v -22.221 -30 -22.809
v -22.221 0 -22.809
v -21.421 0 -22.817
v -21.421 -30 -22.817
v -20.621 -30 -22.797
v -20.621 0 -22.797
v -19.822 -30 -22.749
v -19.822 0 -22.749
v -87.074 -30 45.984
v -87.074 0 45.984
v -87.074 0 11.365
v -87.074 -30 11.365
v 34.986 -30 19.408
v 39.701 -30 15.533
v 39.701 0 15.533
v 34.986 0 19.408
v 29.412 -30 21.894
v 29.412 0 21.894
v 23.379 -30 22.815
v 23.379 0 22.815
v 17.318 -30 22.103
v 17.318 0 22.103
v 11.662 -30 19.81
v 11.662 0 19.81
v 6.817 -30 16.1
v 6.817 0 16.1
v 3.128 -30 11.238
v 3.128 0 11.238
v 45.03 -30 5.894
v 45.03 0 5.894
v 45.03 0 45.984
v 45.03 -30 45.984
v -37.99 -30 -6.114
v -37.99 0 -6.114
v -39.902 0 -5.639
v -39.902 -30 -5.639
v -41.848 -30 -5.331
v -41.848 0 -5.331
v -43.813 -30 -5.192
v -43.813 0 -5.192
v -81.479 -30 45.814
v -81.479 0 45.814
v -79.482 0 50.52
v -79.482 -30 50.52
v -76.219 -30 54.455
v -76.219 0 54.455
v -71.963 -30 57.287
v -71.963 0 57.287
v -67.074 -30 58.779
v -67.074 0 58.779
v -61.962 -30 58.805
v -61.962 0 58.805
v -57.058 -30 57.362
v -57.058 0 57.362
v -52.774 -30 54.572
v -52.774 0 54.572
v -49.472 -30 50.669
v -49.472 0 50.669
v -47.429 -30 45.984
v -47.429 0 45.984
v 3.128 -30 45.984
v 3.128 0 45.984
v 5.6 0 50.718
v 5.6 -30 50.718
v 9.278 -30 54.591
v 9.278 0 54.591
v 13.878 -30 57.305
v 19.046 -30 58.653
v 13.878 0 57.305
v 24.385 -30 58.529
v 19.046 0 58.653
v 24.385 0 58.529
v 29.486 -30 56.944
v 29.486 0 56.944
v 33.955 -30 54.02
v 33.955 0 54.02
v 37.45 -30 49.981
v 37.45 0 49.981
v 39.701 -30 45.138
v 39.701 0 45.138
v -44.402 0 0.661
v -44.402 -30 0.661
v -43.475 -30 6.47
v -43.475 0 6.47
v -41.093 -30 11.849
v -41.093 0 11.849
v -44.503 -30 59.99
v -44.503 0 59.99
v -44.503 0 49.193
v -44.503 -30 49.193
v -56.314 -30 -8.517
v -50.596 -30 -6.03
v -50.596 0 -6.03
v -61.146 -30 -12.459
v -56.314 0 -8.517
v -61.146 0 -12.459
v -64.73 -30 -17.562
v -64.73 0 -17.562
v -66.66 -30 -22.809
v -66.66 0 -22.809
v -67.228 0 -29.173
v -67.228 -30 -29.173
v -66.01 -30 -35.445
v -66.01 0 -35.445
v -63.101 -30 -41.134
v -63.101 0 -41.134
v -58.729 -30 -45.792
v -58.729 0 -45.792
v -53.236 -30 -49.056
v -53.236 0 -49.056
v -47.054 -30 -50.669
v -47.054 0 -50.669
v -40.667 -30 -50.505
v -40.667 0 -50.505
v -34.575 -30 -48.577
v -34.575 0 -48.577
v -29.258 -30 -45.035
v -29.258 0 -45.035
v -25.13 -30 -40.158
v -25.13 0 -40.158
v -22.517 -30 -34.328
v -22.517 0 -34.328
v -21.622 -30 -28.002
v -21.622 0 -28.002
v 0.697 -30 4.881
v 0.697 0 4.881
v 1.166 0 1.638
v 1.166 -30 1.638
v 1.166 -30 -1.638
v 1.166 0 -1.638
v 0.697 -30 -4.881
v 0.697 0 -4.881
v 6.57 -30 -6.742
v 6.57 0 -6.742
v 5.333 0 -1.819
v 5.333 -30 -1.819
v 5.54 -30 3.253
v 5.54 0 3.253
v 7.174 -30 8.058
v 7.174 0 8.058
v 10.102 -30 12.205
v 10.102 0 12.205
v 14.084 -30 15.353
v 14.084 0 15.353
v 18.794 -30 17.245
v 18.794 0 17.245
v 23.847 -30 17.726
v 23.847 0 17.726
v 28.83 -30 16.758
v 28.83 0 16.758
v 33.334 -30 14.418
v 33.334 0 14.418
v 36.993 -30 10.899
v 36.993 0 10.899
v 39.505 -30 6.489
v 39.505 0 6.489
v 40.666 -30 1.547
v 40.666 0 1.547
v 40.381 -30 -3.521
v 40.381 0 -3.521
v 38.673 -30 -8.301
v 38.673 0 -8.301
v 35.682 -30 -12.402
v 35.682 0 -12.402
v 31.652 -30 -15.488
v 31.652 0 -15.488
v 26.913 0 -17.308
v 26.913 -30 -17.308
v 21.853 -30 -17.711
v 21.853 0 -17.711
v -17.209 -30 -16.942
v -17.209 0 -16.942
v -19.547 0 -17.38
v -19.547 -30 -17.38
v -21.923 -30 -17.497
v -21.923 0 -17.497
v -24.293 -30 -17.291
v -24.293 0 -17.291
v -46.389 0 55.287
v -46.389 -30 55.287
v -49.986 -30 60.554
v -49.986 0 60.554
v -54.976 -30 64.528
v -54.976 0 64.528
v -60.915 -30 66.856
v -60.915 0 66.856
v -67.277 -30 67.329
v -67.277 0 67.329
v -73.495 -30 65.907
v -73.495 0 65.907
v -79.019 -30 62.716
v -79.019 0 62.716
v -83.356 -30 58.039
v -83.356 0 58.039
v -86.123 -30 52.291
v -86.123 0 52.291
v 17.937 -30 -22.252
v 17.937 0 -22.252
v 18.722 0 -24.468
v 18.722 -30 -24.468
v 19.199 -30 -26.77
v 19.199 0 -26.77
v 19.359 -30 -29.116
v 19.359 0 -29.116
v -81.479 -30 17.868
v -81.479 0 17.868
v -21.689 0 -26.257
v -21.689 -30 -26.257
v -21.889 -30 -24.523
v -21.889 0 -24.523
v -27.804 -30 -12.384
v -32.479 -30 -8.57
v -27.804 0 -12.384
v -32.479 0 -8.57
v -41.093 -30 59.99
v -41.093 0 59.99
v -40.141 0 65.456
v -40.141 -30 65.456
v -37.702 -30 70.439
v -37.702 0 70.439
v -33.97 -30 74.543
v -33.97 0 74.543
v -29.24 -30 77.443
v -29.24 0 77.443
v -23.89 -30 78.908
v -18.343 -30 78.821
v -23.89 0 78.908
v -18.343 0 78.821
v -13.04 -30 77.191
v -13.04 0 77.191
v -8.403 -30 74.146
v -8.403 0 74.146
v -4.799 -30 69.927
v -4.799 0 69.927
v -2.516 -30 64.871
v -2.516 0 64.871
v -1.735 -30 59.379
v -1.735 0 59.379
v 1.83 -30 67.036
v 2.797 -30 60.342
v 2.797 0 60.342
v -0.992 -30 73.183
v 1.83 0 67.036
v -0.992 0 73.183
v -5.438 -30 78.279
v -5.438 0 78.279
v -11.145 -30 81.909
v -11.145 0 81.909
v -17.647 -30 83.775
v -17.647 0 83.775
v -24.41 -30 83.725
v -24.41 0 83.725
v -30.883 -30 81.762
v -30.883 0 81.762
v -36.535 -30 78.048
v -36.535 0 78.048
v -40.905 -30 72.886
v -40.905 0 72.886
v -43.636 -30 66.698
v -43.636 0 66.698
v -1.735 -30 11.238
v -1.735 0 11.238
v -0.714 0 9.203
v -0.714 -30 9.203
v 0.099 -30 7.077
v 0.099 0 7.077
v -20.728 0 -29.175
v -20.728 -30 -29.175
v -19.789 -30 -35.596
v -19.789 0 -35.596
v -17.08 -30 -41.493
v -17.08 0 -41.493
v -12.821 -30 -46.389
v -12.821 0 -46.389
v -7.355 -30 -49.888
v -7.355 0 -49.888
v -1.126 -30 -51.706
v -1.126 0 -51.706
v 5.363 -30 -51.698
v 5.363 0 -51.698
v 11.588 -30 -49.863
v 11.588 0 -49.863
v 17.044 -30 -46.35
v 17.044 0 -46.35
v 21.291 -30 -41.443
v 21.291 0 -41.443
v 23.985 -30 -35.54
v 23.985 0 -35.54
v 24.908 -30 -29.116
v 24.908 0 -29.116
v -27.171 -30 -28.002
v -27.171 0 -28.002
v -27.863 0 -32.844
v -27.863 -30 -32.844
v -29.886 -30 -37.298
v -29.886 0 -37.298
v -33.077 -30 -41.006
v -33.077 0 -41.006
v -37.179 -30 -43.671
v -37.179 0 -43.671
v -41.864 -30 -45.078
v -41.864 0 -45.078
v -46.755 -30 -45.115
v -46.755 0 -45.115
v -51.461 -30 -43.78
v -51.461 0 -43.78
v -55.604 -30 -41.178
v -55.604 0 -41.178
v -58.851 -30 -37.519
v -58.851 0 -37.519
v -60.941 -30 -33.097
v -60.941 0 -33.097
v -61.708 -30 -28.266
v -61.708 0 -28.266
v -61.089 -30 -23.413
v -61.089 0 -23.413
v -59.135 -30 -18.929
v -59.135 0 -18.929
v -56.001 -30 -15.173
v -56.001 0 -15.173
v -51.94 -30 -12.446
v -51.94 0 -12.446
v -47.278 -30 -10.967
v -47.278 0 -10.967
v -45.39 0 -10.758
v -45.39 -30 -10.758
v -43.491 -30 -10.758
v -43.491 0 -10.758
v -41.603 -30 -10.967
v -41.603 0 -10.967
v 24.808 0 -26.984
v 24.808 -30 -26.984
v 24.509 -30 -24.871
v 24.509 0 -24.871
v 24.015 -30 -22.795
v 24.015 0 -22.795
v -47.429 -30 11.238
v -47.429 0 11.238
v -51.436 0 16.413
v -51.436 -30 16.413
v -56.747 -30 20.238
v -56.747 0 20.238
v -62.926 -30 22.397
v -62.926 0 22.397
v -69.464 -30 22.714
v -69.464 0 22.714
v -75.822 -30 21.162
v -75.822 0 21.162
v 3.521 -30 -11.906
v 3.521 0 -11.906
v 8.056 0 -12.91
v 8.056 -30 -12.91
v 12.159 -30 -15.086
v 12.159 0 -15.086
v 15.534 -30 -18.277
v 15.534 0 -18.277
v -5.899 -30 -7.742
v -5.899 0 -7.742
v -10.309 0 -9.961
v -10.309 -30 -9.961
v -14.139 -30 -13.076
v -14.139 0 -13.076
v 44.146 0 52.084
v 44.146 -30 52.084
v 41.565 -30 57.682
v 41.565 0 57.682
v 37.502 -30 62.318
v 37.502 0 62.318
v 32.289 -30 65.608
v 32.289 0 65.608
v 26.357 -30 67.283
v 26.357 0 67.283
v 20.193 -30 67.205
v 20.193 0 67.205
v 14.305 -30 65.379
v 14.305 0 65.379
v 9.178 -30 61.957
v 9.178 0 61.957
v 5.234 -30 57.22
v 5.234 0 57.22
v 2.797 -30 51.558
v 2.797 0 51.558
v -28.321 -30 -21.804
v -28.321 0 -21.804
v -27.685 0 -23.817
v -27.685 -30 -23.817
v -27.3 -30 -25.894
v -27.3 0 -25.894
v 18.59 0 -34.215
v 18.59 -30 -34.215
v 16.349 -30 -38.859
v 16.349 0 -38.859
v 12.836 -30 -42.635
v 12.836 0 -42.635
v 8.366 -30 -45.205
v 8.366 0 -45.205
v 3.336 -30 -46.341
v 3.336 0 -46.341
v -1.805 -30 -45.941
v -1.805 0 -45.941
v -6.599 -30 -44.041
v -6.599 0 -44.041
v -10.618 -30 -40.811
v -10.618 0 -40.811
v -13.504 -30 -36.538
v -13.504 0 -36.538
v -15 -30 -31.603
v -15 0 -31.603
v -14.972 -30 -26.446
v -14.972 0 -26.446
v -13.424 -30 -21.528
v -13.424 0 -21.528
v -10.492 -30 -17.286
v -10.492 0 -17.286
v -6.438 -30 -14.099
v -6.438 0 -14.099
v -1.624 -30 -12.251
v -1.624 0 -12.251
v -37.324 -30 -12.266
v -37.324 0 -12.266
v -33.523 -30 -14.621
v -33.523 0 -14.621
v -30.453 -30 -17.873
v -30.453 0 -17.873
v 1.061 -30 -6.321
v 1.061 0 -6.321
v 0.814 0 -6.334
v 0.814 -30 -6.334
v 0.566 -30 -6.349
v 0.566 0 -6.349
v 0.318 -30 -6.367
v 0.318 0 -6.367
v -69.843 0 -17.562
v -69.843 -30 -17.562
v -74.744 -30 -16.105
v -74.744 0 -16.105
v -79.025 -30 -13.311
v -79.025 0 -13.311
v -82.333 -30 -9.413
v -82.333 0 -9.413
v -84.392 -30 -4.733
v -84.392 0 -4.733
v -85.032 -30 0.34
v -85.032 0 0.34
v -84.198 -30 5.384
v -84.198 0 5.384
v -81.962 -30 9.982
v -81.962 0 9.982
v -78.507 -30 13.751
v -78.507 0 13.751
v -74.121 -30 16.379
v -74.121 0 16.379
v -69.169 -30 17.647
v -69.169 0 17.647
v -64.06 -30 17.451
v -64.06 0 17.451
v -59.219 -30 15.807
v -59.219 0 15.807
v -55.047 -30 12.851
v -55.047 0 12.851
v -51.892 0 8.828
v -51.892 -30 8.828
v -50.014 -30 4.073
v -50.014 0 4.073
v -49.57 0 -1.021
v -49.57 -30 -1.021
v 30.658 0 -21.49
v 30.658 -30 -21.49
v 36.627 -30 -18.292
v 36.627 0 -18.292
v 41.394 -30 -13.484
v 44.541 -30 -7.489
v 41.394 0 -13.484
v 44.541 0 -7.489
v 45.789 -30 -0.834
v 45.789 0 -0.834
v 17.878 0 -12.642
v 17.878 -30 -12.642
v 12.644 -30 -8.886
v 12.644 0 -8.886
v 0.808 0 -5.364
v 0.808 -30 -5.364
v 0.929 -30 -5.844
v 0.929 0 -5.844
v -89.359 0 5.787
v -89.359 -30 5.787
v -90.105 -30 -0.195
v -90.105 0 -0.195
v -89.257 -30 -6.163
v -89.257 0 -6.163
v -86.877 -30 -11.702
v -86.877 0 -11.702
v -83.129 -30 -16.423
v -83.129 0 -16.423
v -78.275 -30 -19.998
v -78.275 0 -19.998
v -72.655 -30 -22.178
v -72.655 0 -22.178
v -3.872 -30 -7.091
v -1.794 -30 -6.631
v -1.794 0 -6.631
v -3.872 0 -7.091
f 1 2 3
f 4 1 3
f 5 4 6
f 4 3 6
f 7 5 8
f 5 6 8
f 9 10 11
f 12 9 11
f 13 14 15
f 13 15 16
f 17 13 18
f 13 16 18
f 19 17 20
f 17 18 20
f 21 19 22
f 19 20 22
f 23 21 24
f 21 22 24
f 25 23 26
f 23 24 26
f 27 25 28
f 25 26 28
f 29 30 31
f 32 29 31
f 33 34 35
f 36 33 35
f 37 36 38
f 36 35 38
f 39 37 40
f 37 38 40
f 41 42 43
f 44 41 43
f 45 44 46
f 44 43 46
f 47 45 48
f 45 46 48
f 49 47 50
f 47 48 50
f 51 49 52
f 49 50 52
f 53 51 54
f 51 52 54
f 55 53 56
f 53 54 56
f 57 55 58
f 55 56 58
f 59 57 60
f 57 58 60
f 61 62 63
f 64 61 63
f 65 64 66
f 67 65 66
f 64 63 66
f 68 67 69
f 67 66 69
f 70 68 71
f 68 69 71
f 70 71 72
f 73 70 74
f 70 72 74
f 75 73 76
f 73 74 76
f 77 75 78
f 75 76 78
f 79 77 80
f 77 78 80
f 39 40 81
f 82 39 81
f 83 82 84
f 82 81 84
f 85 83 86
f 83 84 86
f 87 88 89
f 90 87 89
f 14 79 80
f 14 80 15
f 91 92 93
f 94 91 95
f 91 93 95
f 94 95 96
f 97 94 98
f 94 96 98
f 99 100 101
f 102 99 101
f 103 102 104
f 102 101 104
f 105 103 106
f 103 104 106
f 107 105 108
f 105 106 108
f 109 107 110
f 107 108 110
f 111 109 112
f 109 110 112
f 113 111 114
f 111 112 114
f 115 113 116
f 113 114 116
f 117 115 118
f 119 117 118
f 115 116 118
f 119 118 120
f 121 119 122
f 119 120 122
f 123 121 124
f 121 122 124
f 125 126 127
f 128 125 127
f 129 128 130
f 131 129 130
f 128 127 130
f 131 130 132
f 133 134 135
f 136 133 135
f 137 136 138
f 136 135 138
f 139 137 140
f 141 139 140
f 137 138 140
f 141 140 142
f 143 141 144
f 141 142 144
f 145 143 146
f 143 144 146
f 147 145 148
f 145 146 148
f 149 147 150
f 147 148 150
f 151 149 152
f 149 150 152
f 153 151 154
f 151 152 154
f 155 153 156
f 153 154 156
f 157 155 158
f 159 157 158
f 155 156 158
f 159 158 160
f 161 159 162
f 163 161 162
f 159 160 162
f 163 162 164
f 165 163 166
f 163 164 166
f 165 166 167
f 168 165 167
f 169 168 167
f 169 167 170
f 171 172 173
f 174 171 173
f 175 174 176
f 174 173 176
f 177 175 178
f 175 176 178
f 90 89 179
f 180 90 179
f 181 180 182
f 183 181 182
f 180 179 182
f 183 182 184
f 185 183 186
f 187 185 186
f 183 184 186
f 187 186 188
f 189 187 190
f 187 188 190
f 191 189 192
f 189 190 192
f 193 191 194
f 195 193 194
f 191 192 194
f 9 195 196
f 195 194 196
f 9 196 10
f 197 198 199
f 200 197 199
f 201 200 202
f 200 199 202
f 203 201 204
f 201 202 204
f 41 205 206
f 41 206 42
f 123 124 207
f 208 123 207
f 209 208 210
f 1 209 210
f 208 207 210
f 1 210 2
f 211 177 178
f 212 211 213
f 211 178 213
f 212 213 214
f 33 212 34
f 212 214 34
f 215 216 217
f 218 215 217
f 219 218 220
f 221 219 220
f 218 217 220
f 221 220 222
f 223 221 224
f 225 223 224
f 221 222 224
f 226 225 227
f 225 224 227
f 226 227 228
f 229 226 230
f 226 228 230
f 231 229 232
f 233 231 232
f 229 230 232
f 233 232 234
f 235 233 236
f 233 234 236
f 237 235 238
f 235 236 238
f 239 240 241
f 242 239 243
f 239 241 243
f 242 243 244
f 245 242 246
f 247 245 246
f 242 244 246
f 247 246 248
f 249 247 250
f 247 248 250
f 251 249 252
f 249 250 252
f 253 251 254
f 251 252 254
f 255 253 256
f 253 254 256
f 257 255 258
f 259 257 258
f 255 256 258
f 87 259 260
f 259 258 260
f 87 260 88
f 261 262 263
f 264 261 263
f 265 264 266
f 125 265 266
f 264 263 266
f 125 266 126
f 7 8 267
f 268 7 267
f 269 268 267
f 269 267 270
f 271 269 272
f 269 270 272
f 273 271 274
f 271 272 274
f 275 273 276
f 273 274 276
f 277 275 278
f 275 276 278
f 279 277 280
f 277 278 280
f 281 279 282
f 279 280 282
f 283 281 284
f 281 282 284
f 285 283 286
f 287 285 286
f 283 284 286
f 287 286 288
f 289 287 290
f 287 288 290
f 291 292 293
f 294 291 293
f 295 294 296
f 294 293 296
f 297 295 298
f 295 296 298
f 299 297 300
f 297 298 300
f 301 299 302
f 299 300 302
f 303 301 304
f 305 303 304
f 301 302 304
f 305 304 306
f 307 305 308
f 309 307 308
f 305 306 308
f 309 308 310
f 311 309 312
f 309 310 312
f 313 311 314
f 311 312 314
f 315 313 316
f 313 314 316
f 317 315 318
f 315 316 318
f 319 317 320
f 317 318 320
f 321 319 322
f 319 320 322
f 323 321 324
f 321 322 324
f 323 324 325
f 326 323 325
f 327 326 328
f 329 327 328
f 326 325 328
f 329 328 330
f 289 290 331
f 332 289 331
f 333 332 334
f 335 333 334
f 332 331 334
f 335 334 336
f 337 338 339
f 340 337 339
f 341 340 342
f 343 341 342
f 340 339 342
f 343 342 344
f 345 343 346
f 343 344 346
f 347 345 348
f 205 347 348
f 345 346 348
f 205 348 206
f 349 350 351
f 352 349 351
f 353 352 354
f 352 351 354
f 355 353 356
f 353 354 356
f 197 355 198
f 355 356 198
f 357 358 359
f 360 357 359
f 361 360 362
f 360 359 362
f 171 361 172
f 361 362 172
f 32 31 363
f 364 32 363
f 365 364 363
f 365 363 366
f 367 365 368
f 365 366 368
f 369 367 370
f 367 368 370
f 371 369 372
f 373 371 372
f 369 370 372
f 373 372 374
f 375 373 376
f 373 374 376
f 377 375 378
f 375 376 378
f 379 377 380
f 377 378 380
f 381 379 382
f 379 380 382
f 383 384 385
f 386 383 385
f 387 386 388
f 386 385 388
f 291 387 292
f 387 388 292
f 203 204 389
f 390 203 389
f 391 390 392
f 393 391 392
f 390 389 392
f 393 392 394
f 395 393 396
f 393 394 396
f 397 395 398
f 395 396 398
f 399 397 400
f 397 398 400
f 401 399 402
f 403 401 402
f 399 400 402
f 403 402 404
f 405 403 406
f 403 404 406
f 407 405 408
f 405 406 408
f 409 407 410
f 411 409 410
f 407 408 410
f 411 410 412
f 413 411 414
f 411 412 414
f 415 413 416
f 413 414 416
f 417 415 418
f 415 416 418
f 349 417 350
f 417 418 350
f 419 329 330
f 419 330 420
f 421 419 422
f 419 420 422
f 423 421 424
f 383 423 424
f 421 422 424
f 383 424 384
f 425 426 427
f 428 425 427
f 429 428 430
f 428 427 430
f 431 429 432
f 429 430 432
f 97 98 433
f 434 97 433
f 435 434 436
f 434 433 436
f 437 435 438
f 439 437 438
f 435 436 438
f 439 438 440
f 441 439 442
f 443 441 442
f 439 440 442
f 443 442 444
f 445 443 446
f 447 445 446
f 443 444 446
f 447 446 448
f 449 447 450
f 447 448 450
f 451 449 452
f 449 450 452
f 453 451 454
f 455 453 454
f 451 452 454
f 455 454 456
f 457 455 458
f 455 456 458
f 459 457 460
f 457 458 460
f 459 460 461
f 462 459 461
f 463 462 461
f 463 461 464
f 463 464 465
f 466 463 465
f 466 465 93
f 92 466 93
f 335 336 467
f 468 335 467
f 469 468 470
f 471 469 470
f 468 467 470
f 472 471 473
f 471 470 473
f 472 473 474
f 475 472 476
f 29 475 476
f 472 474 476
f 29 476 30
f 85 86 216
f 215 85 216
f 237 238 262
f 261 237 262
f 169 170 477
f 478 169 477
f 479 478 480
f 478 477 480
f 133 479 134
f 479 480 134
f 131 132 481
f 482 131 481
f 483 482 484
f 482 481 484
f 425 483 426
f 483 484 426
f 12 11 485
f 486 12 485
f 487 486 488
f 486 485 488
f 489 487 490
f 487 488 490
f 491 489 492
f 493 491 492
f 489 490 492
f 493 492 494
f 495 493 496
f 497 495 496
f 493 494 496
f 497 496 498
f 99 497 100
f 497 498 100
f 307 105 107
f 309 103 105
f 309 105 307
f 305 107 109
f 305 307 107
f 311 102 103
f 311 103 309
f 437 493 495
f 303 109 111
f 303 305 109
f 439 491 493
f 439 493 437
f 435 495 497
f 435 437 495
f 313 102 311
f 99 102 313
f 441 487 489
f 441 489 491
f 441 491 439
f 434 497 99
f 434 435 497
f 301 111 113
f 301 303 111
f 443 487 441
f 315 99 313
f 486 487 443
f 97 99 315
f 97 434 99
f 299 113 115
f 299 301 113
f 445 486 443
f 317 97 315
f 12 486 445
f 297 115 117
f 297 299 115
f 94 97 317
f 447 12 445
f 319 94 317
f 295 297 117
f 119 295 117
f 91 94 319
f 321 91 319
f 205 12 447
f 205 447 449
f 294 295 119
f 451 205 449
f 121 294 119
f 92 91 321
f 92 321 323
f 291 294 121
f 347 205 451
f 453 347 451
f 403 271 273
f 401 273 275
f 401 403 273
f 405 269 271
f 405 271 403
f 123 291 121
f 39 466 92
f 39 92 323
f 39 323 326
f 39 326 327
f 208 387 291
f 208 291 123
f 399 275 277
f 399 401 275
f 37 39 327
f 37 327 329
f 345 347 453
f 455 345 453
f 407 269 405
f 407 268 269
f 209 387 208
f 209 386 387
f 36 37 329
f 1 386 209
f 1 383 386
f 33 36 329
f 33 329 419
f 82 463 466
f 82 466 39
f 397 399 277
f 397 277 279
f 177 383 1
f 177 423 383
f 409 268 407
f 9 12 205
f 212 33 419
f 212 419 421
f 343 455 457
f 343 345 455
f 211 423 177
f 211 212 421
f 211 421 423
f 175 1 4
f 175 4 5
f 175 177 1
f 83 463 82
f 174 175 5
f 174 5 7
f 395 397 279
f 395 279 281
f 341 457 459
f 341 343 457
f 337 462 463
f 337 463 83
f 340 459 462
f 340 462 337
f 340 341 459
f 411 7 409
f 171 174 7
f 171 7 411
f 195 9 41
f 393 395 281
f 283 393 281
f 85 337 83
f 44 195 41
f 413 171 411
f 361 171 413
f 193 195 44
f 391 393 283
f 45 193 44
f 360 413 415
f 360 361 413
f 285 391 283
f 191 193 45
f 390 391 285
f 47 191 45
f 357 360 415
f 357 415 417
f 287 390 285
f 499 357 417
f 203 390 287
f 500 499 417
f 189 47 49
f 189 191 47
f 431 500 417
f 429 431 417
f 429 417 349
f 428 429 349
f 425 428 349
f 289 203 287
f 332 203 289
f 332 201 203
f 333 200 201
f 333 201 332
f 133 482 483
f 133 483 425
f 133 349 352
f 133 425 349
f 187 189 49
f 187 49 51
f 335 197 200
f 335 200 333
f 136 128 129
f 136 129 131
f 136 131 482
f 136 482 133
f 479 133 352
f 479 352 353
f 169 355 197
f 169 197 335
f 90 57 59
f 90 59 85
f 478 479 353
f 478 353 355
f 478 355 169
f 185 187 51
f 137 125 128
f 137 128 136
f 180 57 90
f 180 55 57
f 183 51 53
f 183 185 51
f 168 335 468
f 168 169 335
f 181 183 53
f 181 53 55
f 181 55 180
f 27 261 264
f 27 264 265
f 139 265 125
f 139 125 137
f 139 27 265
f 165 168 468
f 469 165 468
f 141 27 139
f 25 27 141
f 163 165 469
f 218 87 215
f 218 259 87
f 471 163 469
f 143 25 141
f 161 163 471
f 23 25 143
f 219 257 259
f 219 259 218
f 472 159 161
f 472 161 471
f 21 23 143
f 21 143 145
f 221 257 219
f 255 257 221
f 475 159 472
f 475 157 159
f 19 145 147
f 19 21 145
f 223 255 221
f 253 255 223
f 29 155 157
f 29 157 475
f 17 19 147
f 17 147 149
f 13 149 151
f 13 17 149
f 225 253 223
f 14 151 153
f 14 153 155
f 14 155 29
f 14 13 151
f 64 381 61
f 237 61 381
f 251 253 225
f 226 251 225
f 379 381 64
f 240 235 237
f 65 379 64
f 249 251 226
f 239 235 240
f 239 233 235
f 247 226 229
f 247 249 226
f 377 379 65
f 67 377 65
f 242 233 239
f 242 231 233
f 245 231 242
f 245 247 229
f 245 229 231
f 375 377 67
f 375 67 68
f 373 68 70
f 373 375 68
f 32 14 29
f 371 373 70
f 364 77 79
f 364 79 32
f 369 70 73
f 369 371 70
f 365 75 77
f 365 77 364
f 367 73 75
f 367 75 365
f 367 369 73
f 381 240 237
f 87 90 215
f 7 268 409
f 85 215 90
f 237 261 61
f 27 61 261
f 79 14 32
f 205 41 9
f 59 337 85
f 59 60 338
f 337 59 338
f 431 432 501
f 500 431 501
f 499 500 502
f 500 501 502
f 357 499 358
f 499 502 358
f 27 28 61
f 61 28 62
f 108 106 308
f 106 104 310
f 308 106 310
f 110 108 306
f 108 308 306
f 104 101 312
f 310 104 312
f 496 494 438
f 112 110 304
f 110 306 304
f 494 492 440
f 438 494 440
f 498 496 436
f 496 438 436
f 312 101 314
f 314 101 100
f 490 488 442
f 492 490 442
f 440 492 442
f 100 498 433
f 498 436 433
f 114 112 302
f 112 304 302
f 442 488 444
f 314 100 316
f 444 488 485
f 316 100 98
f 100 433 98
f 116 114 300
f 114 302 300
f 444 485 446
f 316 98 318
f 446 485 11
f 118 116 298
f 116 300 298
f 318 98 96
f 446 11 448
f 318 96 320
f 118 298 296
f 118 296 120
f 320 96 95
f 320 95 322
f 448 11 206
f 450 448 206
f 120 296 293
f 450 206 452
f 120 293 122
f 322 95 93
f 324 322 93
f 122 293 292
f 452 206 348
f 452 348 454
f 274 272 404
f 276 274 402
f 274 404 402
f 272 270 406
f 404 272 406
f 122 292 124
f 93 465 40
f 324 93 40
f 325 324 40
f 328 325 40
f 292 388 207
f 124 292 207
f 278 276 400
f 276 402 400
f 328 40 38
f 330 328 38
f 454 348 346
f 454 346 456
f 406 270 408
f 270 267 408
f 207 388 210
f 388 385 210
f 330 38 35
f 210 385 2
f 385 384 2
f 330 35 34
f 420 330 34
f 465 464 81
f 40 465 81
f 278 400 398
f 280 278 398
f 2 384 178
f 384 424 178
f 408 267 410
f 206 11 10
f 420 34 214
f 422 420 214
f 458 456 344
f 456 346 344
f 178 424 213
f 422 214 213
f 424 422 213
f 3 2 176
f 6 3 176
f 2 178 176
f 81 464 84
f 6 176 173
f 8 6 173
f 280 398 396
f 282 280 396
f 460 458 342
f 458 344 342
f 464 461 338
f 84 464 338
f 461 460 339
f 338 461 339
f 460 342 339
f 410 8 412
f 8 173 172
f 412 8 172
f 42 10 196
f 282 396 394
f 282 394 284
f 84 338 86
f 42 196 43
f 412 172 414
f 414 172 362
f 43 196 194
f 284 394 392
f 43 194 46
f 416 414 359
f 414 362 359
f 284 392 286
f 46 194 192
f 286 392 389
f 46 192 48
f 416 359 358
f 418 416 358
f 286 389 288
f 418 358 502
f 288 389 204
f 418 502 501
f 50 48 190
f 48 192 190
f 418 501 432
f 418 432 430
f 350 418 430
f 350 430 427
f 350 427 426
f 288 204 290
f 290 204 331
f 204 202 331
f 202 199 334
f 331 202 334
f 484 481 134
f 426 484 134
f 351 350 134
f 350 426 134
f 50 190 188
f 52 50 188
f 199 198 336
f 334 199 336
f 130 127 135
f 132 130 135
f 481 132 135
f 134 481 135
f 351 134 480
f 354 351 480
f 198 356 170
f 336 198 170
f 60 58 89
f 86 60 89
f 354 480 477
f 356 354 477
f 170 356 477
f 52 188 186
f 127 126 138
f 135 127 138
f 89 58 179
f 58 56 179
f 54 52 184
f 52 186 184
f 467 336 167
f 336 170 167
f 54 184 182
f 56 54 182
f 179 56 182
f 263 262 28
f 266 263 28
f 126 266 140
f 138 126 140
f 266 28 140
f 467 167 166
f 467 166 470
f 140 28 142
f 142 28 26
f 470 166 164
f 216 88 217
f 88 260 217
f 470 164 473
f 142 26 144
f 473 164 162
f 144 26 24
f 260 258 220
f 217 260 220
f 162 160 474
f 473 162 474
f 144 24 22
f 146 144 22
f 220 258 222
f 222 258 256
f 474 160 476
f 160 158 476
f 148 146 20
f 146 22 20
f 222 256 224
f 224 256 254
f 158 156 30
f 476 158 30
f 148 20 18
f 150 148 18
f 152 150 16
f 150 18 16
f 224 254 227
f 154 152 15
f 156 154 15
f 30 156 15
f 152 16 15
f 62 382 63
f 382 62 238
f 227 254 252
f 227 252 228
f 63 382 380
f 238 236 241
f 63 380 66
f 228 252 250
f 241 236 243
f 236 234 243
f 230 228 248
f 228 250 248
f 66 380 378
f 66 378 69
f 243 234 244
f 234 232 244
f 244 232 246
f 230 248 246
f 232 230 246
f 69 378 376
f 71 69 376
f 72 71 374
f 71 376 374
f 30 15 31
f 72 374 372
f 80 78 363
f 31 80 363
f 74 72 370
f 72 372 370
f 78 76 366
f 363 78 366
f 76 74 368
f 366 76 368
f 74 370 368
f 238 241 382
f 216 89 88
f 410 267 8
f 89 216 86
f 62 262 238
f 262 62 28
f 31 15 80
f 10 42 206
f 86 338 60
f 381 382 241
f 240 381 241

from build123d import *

# Parameters (mm, degrees)
F1_DEPTH = 30


# Not quite as in the source:
# - a feature of the source that left no trace in its solid (it failed there, or was rolled back) is left out
# - a feature names something its author has since deleted; it is built from what else it names


with BuildPart() as f1:
    # F0 (on Front) → F1 (new body)
    with BuildSketch(Plane.XZ):
        with BuildLine():
            ThreePointArc((-50.5958115044, -6.02955559), (-47.8576962726, -5.4409727065), (-45.0680997666, -5.1922637066))
            ThreePointArc((-45.0680997666, -5.1922637066), (-44.7014233398, 3.2450721847), (-47.4287139254, 11.2378798646))
            ThreePointArc((-47.4287139254, 11.2378798646), (-62.9262479802, 22.3973362627), (-81.478701042, 17.868151538))
            ThreePointArc((-81.478701042, 17.868151538), (-84.5846312596, 14.8818765302), (-87.0738165711, 11.3649748506))
            ThreePointArc((-87.0738165711, 11.3649748506), (-86.8766386462, -11.7015650942), (-66.6597911749, -22.8093651683))
            ThreePointArc((-66.6597911749, -22.8093651683), (-65.8563320665, -20.1264267988), (-64.7302441516, -17.5621275103))
            ThreePointArc((-64.7302441516, -17.5621275103), (-78.5071405294, 13.7509063134), (-50.5958115044, -6.02955559))
        make_face()
        with BuildLine():
            ThreePointArc((-47.4287139254, 11.2378798646), (-44.7014233398, 3.2450721847), (-45.0680997666, -5.1922637066))
            ThreePointArc((-45.0680997666, -5.1922637066), (-44.4403953733, -5.1836282573), (-43.8126909801, -5.1922637066))
            ThreePointArc((-43.8126909801, -5.1922637066), (-44.1262374484, 3.5955062023), (-41.0934242922, 11.8493087029))
            Line((-41.0934242922, 11.8493087029), (-41.0934242922, 59.9904626227))
            ThreePointArc((-41.0934242922, 59.9904626227), (-21.1129667901, 79.0608636102), (-1.7345135358, 59.3790337844))
            Line((-1.7345135358, 59.3790337844), (-1.7345135358, 11.2378798646))
            ThreePointArc((-1.7345135358, 11.2378798646), (-0.2806344187, 8.1505609331), (0.6965577317, 4.8809434977))
            ThreePointArc((0.6965577317, 4.8809434977), (1.6737498821, 8.1505609331), (3.1276289991, 11.2378798646))
            Line((3.1276289991, 11.2378798646), (3.1276289991, 45.9835585246))
            ThreePointArc((3.1276289991, 45.9835585246), (21.7197442499, 58.7768351813), (39.7009037986, 45.1381923457))
            Line((39.7009037986, 45.1381923457), (39.7009037986, 15.5334114315))
            ThreePointArc((39.7009037986, 15.5334114315), (42.9557629485, 11.0402047373), (45.0299754174, 5.8942687567))
            Line((45.0299754174, 5.8942687567), (45.0299754174, 45.9835585246))
            ThreePointArc((45.0299754174, 45.9835585246), (26.3569721709, 67.2830168196), (2.7973072292, 51.5575546089))
            Line((2.7973072292, 51.5575546089), (2.7973072292, 60.3419492483))
            ThreePointArc((2.7973072292, 60.3419492483), (-21.0300426798, 83.9928980167), (-44.5032843921, 59.9904626227))
            Line((-44.5032843921, 59.9904626227), (-44.5032843921, 49.1925225526))
            ThreePointArc((-44.5032843921, 49.1925225526), (-67.2766387272, 67.32921183), (-87.0738165711, 45.9835585246))
            Line((-87.0738165711, 45.9835585246), (-87.0738165711, 11.3649748506))
            ThreePointArc((-87.0738165711, 11.3649748506), (-84.5846312596, 14.8818765302), (-81.478701042, 17.868151538))
            Line((-81.478701042, 17.868151538), (-81.478701042, 45.8139192271))
            ThreePointArc((-81.478701042, 45.8139192271), (-64.5188702281, 58.9782000656), (-47.4287139254, 45.9835585246))
            Line((-47.4287139254, 45.9835585246), (-47.4287139254, 11.2378798646))
        make_face()
        with BuildLine():
            ThreePointArc((-43.8126909801, -5.1922637066), (-44.4403953733, -5.1836282573), (-45.0680997666, -5.1922637066))
            ThreePointArc((-45.0680997666, -5.1922637066), (-47.8576962726, -5.4409727065), (-50.5958115044, -6.02955559))
            ThreePointArc((-50.5958115044, -6.02955559), (-58.8656531806, -10.3218921863), (-64.7302441516, -17.5621275103))
            ThreePointArc((-64.7302441516, -17.5621275103), (-65.8563320665, -20.1264267988), (-66.6597911749, -22.8093651683))
            ThreePointArc((-66.6597911749, -22.8093651683), (-47.0537232386, -50.6694843019), (-21.6223947557, -28.001628875))
            ThreePointArc((-21.6223947557, -28.001628875), (-21.7725399464, -25.3883010097), (-22.2209995718, -22.8093651683))
            ThreePointArc((-22.2209995718, -22.8093651683), (-23.0778257417, -19.9827903731), (-24.2925817064, -17.2905711947))
            ThreePointArc((-24.2925817064, -17.2905711947), (-30.0151375661, -10.3218921863), (-37.9904438403, -6.1142060617))
            ThreePointArc((-37.9904438403, -6.1142060617), (-40.8716704219, -5.4644295279), (-43.8126909801, -5.1922637066))
        make_face()
        with BuildLine():
            ThreePointArc((-28.3212575169, -21.8035702343), (-27.4607721402, -24.8496563168), (-27.1706954296, -28.001628875))
            ThreePointArc((-27.1706954296, -28.001628875), (-47.5923679315, -44.9812521081), (-60.5595332298, -21.8035702343))
            ThreePointArc((-60.5595332298, -21.8035702343), (-55.3580861087, -14.6208006063), (-47.2776192349, -10.9665856726))
            ThreePointArc((-47.2776192349, -10.9665856726), (-44.4403953733, -10.7319289312), (-41.6031715118, -10.9665856726))
            ThreePointArc((-41.6031715118, -10.9665856726), (-33.522704638, -14.6208006063), (-28.3212575169, -21.8035702343))
        make_face(mode=Mode.SUBTRACT)
        with BuildLine():
            ThreePointArc((-17.209328187, -16.9419843412), (-20.7331119046, -17.4788467793), (-24.2925817064, -17.2905711947))
            ThreePointArc((-24.2925817064, -17.2905711947), (-23.0778257417, -19.9827903731), (-22.2209995718, -22.8093651683))
            ThreePointArc((-22.2209995718, -22.8093651683), (-21.0207224268, -22.8108156941), (-19.8220295884, -22.749148784))
            ThreePointArc((-19.8220295884, -22.749148784), (-18.7192509321, -19.7539774624), (-17.209328187, -16.9419843412))
        make_face()
        with BuildLine():
            ThreePointArc((0.318409666, -6.3669728281), (-2.8385741788, -6.8366801987), (-5.8991326911, -7.7423035215))
            ThreePointArc((-5.8991326911, -7.7423035215), (-12.3087515473, -11.4145268316), (-17.209328187, -16.9419843412))
            ThreePointArc((-17.209328187, -16.9419843412), (-18.7192509321, -19.7539774624), (-19.8220295884, -22.749148784))
            ThreePointArc((-19.8220295884, -22.749148784), (-1.125900704, -51.7064120801), (24.9076758738, -29.1161216121))
            ThreePointArc((24.9076758738, -29.1161216121), (24.6833038658, -25.92408489), (24.0146003931, -22.7948234918))
            ThreePointArc((24.0146003931, -22.7948234918), (23.0881839229, -20.1873038876), (21.8529406759, -17.7111011327))
            ThreePointArc((21.8529406759, -17.7111011327), (15.3942852462, -10.5783627076), (6.5696450929, -6.7422300764))
            ThreePointArc((6.5696450929, -6.7422300764), (3.8283507197, -6.3644588197), (1.0614855049, -6.3212981203))
            ThreePointArc((1.0614855049, -6.3212981203), (0.6897612956, -6.3411047495), (0.318409666, -6.3669728281))
        make_face()
        with BuildLine():
            ThreePointArc((19.3593751999, -29.1161216121), (-10.6177327064, -40.8107493967), (3.5207306993, -11.9058160812))
            ThreePointArc((3.5207306993, -11.9058160812), (12.1592087901, -15.0859031335), (17.936744923, -22.2522364789))
            ThreePointArc((17.936744923, -22.2522364789), (18.9999779483, -25.6112394448), (19.3593751999, -29.1161216121))
        make_face(mode=Mode.SUBTRACT)
        with BuildLine():
            ThreePointArc((3.1276289991, 11.2378798646), (1.6737498821, 8.1505609331), (0.6965577317, 4.8809434977))
            ThreePointArc((0.6965577317, 4.8809434977), (1.2247054391, 0), (0.6965577317, -4.8809434977))
            ThreePointArc((0.6965577317, -4.8809434977), (0.8672943666, -5.6040920216), (1.0614855049, -6.3212981203))
            ThreePointArc((1.0614855049, -6.3212981203), (3.8283507197, -6.3644588197), (6.5696450929, -6.7422300764))
            ThreePointArc((6.5696450929, -6.7422300764), (33.3344406342, 14.4182569257), (21.8529406759, -17.7111011327))
            ThreePointArc((21.8529406759, -17.7111011327), (23.0881839229, -20.1873038876), (24.0146003931, -22.7948234918))
            ThreePointArc((24.0146003931, -22.7948234918), (41.3940847955, -13.484015887), (45.0299754174, 5.8942687567))
            ThreePointArc((45.0299754174, 5.8942687567), (42.9557629485, 11.0402047373), (39.7009037986, 15.5334114315))
            ThreePointArc((39.7009037986, 15.5334114315), (20.3247315889, 22.6622288579), (3.1276289991, 11.2378798646))
        make_face()
    extrude(amount=F1_DEPTH)


solid = f1.part
